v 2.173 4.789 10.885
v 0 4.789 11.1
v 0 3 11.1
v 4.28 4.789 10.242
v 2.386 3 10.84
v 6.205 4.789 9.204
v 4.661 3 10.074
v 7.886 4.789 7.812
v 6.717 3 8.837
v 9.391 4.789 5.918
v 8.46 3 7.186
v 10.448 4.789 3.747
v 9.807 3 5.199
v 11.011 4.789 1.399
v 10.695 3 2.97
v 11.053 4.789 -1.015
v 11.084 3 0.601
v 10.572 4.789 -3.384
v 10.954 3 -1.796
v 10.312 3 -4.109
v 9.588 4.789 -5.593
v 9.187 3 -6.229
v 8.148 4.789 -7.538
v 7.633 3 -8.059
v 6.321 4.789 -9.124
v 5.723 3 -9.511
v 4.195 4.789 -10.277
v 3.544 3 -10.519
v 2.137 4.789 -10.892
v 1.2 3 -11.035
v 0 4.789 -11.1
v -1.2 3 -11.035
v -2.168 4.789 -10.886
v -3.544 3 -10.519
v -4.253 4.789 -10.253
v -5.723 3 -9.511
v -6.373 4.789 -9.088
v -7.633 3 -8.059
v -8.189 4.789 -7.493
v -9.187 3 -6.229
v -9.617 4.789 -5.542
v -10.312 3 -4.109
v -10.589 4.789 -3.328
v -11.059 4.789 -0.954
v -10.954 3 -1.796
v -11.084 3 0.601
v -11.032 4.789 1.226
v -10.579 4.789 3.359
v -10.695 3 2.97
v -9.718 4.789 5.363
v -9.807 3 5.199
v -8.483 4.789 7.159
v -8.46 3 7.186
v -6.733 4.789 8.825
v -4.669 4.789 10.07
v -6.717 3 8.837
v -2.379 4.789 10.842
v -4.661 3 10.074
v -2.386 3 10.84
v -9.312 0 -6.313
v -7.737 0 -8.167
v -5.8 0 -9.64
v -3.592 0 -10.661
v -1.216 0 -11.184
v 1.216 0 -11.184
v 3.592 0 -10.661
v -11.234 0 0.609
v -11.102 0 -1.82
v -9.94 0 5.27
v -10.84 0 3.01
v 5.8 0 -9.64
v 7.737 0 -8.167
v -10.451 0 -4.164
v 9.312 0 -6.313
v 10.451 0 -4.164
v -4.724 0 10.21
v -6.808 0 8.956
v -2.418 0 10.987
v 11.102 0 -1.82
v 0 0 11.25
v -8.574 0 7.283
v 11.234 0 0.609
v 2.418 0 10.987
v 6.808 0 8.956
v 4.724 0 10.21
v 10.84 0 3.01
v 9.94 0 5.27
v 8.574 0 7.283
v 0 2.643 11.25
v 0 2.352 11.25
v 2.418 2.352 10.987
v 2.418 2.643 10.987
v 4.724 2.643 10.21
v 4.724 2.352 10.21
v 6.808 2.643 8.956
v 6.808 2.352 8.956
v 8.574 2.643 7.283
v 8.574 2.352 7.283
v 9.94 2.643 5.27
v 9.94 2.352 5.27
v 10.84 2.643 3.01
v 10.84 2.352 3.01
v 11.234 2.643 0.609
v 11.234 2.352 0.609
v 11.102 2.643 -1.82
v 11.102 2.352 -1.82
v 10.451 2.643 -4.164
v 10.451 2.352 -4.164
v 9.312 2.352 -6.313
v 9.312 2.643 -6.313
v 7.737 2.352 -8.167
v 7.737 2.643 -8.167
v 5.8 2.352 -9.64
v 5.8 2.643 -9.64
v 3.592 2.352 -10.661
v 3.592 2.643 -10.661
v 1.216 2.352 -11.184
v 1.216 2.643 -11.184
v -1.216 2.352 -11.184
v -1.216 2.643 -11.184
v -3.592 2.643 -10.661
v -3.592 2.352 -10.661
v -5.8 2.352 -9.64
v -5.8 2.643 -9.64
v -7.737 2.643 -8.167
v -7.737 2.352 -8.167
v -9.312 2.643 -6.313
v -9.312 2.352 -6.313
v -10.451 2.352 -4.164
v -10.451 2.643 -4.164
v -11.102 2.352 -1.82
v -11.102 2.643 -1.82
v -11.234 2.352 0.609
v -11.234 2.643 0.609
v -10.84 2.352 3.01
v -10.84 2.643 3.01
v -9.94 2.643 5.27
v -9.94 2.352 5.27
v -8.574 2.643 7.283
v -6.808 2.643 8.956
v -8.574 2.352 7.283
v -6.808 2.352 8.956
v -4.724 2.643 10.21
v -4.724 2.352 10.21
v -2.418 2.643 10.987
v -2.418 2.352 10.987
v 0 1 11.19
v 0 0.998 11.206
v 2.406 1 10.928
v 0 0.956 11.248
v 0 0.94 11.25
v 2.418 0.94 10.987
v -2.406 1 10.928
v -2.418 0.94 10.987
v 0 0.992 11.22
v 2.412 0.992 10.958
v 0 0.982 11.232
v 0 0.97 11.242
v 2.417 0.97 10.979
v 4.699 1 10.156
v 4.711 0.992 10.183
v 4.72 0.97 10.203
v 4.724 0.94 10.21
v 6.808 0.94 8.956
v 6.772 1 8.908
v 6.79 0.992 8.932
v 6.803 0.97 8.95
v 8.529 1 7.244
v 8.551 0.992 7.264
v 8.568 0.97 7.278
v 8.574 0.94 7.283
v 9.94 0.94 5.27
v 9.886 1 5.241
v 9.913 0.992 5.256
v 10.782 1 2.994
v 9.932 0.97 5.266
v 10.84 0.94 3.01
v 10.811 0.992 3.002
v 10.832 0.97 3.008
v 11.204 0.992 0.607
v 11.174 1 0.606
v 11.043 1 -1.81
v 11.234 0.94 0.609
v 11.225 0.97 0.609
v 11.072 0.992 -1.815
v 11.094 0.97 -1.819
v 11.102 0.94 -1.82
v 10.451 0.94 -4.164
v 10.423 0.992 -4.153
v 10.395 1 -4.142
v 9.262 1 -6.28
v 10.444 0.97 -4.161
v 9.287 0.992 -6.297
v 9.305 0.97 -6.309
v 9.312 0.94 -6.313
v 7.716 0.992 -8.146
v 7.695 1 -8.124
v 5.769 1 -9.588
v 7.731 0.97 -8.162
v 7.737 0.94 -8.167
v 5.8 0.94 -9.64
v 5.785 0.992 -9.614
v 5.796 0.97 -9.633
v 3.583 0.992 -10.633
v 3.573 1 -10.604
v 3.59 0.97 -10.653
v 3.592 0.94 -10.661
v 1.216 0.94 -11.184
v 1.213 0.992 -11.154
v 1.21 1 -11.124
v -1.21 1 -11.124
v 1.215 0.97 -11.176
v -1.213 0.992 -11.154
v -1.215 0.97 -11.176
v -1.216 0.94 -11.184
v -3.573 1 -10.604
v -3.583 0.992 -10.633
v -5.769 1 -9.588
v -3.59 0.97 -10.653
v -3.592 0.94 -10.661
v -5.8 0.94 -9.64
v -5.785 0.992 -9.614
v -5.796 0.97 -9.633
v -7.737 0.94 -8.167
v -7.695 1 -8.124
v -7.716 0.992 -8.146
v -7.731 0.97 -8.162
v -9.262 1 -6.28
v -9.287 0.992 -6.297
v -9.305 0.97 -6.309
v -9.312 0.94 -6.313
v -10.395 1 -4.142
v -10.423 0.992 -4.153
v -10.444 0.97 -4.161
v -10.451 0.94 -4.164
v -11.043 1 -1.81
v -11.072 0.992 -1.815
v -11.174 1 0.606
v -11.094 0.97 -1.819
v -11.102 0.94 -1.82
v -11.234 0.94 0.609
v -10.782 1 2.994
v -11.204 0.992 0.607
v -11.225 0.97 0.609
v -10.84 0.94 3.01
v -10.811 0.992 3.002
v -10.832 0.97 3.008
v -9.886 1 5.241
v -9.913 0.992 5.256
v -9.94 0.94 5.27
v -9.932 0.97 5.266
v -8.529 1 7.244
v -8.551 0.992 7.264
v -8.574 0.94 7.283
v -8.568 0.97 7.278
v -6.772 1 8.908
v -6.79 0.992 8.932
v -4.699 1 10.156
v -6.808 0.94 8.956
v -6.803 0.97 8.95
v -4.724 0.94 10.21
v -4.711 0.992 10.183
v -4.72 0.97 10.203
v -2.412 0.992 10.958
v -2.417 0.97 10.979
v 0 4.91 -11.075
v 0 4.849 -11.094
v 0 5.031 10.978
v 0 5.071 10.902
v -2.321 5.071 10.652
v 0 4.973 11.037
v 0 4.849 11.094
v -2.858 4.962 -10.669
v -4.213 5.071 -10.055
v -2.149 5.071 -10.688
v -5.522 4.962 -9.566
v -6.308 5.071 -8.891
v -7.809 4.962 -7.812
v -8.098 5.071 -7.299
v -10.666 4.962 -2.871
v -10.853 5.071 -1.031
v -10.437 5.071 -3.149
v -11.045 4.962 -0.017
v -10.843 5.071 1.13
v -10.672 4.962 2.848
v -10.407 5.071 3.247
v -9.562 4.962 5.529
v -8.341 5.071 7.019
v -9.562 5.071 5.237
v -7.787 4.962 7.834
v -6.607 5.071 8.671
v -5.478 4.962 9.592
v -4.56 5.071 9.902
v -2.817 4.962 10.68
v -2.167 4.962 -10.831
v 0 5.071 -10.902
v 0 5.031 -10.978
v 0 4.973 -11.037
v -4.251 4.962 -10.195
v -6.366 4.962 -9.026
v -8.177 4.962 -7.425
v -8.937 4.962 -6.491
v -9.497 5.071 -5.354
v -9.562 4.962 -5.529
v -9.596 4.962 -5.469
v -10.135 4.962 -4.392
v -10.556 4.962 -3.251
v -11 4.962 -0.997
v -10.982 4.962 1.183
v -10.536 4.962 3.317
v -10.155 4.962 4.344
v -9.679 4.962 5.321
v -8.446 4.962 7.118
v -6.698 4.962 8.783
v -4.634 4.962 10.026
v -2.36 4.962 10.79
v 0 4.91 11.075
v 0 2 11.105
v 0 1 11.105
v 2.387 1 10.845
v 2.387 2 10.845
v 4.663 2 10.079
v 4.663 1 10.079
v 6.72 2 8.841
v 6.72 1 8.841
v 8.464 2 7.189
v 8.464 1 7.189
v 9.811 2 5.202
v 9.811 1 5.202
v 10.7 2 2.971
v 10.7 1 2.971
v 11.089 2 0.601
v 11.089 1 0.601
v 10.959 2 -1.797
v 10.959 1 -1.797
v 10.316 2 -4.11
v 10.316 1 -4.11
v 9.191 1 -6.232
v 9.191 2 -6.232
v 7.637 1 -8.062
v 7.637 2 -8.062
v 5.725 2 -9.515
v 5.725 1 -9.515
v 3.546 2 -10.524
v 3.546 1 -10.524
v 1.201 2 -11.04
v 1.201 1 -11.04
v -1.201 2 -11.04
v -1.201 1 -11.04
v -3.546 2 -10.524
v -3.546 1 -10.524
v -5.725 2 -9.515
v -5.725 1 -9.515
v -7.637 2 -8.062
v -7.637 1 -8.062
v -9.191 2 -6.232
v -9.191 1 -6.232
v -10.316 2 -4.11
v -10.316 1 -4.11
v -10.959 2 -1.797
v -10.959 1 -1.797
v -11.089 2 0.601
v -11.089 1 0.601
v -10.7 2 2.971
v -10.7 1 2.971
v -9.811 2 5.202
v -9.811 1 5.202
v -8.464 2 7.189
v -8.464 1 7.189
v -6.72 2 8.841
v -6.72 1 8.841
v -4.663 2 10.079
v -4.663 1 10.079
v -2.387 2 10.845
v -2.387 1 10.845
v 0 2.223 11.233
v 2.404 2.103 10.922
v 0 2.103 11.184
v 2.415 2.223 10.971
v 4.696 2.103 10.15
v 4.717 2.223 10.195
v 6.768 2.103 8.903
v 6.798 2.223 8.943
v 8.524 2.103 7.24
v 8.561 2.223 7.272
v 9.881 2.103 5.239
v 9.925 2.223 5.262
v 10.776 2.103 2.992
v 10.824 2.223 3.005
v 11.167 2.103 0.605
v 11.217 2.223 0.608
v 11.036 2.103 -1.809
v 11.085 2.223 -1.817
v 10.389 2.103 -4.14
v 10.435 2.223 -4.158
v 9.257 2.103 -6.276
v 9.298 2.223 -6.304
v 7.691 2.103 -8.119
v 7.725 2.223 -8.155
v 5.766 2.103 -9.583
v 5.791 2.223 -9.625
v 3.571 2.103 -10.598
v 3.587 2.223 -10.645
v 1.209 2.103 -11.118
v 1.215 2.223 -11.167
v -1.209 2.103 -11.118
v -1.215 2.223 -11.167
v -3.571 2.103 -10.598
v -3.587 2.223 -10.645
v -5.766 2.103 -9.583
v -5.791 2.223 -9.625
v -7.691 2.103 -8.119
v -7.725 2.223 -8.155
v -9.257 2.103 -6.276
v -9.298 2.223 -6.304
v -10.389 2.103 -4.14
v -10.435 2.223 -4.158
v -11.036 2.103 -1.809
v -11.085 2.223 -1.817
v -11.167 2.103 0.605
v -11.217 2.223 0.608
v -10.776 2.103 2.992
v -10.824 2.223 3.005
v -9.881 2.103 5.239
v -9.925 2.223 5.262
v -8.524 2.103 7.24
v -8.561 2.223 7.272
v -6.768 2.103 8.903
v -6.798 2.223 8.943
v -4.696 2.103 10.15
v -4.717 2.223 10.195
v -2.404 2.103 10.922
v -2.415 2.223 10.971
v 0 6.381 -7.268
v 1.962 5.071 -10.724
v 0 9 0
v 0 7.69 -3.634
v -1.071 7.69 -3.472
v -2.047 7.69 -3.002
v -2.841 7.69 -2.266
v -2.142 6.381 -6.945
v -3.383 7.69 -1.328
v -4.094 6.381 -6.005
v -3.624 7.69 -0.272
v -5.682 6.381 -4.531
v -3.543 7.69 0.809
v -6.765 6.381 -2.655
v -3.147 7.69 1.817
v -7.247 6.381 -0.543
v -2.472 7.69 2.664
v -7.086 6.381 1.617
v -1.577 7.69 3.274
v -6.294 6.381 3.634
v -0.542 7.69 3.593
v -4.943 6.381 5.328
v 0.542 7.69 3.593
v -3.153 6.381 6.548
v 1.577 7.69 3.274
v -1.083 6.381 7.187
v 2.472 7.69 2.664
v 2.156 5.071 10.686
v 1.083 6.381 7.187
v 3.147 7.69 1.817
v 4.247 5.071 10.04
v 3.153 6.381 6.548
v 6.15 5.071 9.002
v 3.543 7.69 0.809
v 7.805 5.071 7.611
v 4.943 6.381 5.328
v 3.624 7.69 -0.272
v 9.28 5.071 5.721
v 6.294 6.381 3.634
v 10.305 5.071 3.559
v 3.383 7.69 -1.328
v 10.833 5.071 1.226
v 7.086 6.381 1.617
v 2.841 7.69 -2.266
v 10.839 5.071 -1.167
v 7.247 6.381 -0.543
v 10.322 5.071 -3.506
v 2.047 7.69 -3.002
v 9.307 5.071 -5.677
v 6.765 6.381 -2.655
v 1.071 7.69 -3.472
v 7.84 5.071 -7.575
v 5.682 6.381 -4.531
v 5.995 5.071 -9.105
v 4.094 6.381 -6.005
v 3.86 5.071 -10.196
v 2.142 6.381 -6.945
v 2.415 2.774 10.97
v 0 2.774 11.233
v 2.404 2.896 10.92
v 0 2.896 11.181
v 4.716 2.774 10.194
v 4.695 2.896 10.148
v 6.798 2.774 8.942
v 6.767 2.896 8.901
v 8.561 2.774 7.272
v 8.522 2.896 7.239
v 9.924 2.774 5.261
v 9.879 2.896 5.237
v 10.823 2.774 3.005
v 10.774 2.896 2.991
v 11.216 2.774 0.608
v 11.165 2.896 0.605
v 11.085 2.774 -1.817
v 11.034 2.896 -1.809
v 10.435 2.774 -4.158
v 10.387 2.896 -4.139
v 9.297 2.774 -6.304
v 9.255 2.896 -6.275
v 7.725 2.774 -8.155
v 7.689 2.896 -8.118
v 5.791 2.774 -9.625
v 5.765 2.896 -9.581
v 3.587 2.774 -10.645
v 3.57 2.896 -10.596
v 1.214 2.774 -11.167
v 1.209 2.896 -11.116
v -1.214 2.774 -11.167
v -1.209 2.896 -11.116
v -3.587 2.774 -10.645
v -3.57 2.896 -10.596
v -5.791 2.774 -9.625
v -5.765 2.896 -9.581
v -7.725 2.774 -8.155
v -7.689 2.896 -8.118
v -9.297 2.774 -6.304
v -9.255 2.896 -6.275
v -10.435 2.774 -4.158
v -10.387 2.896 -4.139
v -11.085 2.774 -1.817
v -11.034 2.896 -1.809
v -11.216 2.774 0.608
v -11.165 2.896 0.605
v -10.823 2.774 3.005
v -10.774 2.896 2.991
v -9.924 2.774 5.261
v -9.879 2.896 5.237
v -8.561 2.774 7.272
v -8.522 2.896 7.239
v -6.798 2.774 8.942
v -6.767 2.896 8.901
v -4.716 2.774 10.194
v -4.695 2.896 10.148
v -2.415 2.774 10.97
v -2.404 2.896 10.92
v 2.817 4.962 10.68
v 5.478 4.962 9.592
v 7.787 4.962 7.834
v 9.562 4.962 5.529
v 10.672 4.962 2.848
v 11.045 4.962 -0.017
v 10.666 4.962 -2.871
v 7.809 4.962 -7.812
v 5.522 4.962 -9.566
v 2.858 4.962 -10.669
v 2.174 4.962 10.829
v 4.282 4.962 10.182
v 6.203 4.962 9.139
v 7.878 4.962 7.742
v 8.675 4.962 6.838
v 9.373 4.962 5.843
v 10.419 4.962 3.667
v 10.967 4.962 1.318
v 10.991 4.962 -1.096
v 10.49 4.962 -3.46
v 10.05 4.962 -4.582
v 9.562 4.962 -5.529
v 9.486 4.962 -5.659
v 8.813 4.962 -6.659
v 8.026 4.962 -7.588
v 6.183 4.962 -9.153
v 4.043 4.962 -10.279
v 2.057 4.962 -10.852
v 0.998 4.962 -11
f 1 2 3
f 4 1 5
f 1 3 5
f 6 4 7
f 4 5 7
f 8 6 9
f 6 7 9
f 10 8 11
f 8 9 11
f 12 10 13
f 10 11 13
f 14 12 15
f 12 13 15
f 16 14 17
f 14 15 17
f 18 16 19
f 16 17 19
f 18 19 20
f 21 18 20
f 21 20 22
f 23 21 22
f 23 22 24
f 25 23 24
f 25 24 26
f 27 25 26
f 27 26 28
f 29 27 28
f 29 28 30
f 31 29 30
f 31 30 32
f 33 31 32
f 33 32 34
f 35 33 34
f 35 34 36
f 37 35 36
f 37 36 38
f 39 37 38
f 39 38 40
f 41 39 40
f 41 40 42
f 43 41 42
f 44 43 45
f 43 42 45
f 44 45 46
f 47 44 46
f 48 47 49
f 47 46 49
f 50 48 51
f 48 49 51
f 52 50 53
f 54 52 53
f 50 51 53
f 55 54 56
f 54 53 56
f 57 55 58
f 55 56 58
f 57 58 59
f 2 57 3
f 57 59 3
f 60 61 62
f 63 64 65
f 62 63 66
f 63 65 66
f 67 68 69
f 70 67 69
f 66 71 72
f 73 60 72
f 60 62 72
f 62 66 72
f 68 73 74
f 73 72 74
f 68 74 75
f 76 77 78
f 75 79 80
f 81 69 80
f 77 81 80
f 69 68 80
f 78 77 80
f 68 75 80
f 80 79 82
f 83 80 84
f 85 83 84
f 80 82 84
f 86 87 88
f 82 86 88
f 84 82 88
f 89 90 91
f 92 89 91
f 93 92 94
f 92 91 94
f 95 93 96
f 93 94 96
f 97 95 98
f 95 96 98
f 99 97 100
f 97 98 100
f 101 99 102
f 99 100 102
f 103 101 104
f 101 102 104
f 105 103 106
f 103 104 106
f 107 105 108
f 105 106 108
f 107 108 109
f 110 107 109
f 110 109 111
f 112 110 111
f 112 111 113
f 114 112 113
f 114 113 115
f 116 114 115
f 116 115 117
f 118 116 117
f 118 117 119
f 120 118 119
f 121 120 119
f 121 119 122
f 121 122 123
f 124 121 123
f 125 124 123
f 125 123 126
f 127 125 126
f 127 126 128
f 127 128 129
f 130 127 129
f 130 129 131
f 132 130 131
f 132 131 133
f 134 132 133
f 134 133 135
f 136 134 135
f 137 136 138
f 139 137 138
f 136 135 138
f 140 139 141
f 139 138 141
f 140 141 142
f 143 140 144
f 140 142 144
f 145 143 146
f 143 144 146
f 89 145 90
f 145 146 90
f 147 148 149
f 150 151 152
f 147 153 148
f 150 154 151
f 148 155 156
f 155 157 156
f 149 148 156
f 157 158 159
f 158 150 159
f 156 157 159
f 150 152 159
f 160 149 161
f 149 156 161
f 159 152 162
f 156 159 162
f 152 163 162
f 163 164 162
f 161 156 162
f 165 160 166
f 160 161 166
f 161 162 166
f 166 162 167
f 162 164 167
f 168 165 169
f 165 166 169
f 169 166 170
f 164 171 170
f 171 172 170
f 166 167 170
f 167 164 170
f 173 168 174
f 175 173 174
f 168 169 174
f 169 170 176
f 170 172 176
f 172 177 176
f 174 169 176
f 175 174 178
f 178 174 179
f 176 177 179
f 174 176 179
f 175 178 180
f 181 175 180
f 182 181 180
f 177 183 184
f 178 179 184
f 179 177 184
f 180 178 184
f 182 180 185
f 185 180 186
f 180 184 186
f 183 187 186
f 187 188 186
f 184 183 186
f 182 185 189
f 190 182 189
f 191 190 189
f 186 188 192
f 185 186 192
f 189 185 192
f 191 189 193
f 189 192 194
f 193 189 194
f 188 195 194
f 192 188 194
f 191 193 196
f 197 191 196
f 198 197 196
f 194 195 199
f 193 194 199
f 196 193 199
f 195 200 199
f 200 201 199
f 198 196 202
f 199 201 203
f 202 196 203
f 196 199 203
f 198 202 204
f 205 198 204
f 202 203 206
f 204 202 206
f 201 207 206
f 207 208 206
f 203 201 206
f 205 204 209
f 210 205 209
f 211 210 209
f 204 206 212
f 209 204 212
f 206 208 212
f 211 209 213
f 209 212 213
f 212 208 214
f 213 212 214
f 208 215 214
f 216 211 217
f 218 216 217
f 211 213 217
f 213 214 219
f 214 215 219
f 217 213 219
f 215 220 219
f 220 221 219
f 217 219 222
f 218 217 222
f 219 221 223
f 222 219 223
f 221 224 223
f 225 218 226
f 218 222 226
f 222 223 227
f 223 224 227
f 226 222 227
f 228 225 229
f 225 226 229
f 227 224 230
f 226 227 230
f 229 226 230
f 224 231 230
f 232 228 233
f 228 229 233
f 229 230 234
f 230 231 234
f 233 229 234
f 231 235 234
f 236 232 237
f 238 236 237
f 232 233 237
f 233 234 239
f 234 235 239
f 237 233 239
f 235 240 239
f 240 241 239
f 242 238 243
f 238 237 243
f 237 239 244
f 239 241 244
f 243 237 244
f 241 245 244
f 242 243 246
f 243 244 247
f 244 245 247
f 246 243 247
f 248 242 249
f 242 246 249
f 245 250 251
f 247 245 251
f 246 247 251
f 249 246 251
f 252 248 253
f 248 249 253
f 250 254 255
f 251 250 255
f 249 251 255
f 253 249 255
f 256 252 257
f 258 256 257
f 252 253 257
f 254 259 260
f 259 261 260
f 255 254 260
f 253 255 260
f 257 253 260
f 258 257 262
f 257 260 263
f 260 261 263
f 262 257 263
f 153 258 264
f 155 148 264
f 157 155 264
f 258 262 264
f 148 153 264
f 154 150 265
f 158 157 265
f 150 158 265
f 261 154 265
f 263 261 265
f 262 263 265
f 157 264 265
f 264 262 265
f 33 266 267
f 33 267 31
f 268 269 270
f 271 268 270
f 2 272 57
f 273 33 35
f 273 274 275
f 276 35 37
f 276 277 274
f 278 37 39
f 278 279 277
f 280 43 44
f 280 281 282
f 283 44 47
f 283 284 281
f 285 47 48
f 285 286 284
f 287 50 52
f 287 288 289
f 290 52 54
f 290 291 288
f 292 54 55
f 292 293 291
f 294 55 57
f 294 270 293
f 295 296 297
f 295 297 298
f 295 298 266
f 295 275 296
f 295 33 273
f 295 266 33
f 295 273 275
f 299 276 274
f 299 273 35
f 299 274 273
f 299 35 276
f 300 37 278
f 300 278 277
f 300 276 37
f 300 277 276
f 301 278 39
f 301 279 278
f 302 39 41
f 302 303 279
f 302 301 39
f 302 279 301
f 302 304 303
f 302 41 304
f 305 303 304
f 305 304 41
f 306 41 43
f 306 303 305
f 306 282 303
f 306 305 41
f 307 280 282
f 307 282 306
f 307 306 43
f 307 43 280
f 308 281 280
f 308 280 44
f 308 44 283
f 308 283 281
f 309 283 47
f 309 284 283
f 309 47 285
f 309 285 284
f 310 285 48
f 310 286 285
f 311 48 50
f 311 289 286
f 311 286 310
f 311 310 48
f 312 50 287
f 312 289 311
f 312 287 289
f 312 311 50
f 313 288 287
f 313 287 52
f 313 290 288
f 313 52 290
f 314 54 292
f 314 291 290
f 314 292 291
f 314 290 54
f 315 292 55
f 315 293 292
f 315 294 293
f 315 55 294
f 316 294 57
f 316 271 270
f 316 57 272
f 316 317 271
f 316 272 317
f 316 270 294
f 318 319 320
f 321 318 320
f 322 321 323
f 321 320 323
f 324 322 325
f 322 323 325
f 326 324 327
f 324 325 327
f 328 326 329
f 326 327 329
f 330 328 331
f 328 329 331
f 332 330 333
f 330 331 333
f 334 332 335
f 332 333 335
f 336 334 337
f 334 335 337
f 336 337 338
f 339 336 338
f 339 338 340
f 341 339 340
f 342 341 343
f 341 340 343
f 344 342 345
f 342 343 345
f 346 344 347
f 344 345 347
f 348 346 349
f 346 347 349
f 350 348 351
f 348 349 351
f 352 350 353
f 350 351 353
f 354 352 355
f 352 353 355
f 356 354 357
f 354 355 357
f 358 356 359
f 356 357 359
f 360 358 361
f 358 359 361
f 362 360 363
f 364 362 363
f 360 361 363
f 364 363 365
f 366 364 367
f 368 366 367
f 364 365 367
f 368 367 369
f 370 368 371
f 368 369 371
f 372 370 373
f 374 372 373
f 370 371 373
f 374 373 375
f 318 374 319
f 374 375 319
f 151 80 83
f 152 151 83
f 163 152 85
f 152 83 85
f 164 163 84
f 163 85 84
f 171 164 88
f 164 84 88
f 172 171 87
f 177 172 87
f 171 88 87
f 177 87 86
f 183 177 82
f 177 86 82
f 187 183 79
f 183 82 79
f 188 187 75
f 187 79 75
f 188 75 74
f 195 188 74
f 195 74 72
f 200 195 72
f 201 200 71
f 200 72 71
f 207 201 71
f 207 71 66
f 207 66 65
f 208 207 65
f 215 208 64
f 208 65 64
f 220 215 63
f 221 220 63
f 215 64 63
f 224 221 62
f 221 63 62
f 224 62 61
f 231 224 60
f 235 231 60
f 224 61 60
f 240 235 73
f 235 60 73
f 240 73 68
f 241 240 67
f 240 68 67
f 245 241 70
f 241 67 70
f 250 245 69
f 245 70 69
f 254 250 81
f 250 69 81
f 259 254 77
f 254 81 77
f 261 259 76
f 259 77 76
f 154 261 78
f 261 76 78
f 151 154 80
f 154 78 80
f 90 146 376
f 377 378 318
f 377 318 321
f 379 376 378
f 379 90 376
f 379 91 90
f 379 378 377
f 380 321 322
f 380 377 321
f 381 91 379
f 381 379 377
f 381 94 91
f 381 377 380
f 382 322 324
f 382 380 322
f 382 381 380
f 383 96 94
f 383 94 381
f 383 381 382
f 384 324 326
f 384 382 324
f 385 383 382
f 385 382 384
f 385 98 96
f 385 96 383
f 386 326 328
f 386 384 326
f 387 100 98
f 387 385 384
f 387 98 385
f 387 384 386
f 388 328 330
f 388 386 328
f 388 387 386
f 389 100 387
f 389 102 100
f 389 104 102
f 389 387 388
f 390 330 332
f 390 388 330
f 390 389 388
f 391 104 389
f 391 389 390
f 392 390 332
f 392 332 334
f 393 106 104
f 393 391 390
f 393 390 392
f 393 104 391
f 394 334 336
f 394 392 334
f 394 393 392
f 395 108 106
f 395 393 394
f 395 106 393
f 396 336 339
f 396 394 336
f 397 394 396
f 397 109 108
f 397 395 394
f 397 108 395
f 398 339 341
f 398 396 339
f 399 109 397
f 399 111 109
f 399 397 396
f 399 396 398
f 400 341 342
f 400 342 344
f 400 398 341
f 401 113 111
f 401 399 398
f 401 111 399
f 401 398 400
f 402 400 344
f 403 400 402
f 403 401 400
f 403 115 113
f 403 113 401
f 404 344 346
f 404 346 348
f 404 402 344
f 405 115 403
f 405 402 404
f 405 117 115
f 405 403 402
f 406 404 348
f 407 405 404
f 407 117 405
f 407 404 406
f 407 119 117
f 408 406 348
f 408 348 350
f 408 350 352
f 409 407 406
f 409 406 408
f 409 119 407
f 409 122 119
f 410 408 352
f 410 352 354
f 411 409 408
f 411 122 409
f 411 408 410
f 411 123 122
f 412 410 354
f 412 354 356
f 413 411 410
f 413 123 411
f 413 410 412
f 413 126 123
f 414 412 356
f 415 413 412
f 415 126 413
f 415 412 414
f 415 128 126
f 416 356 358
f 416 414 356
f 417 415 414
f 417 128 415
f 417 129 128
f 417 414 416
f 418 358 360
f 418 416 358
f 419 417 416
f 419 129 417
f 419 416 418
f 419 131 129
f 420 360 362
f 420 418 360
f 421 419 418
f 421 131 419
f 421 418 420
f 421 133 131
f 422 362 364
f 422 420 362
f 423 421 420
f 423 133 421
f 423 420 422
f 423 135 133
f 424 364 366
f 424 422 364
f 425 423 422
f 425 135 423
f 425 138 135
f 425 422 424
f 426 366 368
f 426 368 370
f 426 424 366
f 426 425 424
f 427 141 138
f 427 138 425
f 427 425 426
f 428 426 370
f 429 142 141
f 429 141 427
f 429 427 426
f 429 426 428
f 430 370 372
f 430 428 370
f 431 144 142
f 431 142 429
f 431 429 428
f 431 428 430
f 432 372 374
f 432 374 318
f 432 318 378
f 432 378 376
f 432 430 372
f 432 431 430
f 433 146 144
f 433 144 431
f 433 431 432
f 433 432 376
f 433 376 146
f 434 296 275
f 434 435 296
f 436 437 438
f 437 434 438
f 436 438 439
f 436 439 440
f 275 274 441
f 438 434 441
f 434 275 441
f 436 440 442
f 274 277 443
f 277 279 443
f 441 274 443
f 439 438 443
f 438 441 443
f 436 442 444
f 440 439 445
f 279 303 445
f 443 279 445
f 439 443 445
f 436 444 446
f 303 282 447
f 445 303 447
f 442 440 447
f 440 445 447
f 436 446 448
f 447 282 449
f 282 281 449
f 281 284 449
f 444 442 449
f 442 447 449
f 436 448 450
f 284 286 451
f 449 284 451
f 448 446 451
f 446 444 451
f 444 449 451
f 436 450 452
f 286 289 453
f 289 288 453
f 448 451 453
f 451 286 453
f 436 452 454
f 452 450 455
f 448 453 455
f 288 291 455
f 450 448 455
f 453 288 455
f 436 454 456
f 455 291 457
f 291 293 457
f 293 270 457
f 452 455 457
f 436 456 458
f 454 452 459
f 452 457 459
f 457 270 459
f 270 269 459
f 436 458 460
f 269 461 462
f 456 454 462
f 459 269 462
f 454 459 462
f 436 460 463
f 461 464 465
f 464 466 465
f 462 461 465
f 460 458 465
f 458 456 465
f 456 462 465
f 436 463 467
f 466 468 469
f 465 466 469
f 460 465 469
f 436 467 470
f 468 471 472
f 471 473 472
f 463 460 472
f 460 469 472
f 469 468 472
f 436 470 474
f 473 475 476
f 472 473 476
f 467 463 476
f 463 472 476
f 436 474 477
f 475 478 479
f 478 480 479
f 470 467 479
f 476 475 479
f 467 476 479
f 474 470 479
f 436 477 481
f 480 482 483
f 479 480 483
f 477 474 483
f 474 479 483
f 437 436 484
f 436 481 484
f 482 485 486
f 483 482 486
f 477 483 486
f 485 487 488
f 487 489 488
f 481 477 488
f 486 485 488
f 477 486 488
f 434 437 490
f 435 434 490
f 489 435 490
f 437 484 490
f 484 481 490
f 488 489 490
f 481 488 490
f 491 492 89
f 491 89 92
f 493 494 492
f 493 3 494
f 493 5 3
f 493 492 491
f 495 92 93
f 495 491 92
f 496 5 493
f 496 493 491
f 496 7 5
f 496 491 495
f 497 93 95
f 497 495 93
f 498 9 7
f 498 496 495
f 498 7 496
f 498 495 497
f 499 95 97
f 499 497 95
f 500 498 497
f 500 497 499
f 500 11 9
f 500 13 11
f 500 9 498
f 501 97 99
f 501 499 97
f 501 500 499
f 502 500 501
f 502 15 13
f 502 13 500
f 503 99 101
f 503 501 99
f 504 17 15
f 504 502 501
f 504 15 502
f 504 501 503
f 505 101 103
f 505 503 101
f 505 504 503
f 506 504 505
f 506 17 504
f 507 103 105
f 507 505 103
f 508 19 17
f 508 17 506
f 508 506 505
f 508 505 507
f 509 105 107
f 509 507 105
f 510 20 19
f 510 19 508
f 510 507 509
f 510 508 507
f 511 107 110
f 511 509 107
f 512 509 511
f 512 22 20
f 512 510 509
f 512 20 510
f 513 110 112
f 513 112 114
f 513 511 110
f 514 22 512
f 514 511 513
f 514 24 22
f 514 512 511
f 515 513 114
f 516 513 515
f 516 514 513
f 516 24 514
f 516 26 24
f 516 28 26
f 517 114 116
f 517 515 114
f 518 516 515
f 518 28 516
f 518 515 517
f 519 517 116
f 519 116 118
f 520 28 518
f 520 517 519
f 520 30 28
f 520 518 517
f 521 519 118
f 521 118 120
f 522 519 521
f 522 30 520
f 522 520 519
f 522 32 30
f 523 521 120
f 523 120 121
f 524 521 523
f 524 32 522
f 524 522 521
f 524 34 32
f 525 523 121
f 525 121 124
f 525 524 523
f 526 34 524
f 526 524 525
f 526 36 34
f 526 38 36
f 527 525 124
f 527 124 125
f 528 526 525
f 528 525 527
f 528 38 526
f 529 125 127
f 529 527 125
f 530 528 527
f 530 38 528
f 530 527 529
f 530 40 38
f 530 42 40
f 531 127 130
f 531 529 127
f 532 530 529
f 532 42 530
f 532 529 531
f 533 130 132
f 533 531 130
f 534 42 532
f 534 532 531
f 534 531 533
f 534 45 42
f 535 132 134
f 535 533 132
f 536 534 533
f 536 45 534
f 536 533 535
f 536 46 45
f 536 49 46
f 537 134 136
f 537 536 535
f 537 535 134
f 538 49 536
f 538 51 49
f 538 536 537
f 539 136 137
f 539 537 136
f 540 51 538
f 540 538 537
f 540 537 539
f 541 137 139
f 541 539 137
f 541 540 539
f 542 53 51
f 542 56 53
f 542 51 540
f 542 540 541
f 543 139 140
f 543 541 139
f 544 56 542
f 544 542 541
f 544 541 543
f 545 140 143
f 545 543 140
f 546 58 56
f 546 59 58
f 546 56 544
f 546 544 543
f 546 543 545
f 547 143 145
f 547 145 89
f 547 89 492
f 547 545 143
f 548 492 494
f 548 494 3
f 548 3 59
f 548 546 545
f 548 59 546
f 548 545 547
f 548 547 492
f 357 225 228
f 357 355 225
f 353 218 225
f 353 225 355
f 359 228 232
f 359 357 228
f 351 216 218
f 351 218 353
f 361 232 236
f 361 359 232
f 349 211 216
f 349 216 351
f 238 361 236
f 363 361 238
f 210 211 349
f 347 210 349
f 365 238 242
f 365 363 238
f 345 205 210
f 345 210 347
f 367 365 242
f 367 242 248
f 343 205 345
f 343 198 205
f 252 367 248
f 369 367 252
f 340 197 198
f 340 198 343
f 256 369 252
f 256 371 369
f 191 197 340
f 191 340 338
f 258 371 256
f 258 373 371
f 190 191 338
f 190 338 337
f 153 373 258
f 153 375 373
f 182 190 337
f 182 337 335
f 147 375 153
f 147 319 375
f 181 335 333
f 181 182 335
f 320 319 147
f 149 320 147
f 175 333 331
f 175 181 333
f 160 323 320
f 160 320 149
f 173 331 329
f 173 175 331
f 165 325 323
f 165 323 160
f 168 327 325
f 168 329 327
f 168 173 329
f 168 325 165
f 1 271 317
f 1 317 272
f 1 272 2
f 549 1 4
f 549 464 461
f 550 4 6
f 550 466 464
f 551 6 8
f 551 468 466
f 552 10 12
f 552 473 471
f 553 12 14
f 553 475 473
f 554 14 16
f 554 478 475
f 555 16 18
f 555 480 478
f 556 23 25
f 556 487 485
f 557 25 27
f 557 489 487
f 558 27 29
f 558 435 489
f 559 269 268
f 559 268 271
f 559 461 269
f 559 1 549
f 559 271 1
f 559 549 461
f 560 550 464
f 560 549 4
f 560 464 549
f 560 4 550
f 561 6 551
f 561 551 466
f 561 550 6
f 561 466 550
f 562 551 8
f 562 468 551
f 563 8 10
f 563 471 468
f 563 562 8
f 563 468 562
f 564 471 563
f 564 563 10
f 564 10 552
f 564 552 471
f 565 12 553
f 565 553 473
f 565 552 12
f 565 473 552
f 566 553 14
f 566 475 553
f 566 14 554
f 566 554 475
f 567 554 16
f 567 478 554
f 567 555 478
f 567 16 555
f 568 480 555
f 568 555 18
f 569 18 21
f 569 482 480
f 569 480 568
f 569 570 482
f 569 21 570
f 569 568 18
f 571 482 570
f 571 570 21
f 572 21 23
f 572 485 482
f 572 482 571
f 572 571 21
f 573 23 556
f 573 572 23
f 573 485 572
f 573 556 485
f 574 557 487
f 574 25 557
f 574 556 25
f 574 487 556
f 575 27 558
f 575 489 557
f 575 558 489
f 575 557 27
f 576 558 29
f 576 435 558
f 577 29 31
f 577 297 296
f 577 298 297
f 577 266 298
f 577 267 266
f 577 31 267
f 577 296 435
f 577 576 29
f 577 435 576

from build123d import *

# Parameters (mm, degrees)
SKETCH1_R           = 11.25
BOSS_EXTRUDE1_DEPTH = 1
SKETCH2_R           = 11.105
BOSS_EXTRUDE2_DEPTH = 1
SKETCH3_R           = 11.25
BOSS_EXTRUDE3_DEPTH = 1
SKETCH4_R           = 11.1
BOSS_EXTRUDE4_DEPTH = 2
FILLET1_R           = 0.3
FILLET3_R           = 0.5
FILLET4_R           = 0.06


with BuildPart() as part:
    # Sketch1 → Boss-Extrude1 (new body)
    with BuildSketch(Plane(origin=(0, 0, 0), x_dir=(1, 0, 0), z_dir=(0, 1, 0))):
        with Locations(Location((0, 0, 0), (0, 0, 270))):
            Circle(SKETCH1_R)
    extrude(amount=BOSS_EXTRUDE1_DEPTH)

    # Sketch2 → Boss-Extrude2 (add)
    with BuildSketch(Plane(origin=(0, 1, 0), x_dir=(1, 0, 0), z_dir=(0, 1, 0))):
        with Locations(Location((0, 0, 0), (0, 0, 270))):
            Circle(SKETCH2_R)
    extrude(amount=BOSS_EXTRUDE2_DEPTH)

    # Sketch3 → Boss-Extrude3 (add)
    with BuildSketch(Plane(origin=(0, 2, 0), x_dir=(1, 0, 0), z_dir=(0, 1, 0))):
        with Locations(Location((0, 0, 0), (0, 0, 270))):
            Circle(SKETCH3_R)
    extrude(amount=BOSS_EXTRUDE3_DEPTH)

    # Sketch4 → Boss-Extrude4 (add)
    with BuildSketch(Plane(origin=(0, 3, 0), x_dir=(1, 0, 0), z_dir=(0, 1, 0))):
        with Locations(Location((0, 0, 0), (0, 0, 270))):
            Circle(SKETCH4_R)
    extrude(amount=BOSS_EXTRUDE4_DEPTH)

    # Sketch6 → Revolve1 (revolve)
    with BuildSketch(Plane(origin=(0, 0, 0), x_dir=(0.06000839273320703, 0, 0.9981978725691502), z_dir=(-0.9981978725691503, 0, 0.06000839273320704)), mode=Mode.PRIVATE) as revolve1_sk:
        Polygon((11.1, 5), (0, 5), (0, 9), align=None)
    revolve(revolve1_sk.sketch.rotate(Axis((0, 5, 0), (0, 1, 0)), 176.559705496), axis=Axis((0, 5, 0), (0, 1, 0)))

    # Fillet1
    fillet1_edges = [part.edges().sort_by_distance(p)[0] for p in [
        (-11.1, 5, 0),
    ]]
    fillet(fillet1_edges, radius=FILLET1_R)

    # Fillet3
    # the kernel refuses this fillet: 0.5 mm, written as the material it takes off along each edge
    with BuildSketch(Plane(origin=(0, 3, 0), x_dir=(0, 0, 1), z_dir=(-1, 0, 0))) as fillet3_piece_1:
        with BuildLine():
            CenterArc((10.75, -0.357071421), FILLET3_R, 0, 45.572995999)
            Line((11.25, -0.357071421), (11.26, -0.357071421))
            Line((11.26, -0.357071421), (11.26, 0))
            Line((11.26, 0), (11.25, 0.01))
            ThreePointArc((11.25, 0.01), (11.175, 0.01), (11.107, 0.007141428))
            Line((11.107, 0.007141428), (11.1, 0))
        make_face()
    revolve(axis=Axis((0, 3, 0), (0, 1, 0)), mode=Mode.SUBTRACT)
    with BuildSketch(Plane(origin=(0, 2, 0), x_dir=(0, 0, 1), z_dir=(-1, 0, 0))) as fillet3_piece_2:
        with BuildLine():
            CenterArc((10.75, 0.352100838), FILLET3_R, 315.234915329, 44.765084671)
            Line((11.105, 0), (11.1121, -0.007042017))
            ThreePointArc((11.1121, -0.007042017), (11.1775, -0.01), (11.25, -0.01))
            Line((11.25, -0.01), (11.26, 0))
            Line((11.26, 0), (11.26, 0.352100838))
            Line((11.26, 0.352100838), (11.25, 0.352100838))
        make_face()
    revolve(axis=Axis((0, 2, 0), (0, 1, 0)), mode=Mode.SUBTRACT)

    # Fillet4
    fillet4_edges = [part.edges().sort_by_distance(p)[0] for p in [
        (0, 1, -11.25),
    ]]
    fillet(fillet4_edges, radius=FILLET4_R)


solid = part.part
